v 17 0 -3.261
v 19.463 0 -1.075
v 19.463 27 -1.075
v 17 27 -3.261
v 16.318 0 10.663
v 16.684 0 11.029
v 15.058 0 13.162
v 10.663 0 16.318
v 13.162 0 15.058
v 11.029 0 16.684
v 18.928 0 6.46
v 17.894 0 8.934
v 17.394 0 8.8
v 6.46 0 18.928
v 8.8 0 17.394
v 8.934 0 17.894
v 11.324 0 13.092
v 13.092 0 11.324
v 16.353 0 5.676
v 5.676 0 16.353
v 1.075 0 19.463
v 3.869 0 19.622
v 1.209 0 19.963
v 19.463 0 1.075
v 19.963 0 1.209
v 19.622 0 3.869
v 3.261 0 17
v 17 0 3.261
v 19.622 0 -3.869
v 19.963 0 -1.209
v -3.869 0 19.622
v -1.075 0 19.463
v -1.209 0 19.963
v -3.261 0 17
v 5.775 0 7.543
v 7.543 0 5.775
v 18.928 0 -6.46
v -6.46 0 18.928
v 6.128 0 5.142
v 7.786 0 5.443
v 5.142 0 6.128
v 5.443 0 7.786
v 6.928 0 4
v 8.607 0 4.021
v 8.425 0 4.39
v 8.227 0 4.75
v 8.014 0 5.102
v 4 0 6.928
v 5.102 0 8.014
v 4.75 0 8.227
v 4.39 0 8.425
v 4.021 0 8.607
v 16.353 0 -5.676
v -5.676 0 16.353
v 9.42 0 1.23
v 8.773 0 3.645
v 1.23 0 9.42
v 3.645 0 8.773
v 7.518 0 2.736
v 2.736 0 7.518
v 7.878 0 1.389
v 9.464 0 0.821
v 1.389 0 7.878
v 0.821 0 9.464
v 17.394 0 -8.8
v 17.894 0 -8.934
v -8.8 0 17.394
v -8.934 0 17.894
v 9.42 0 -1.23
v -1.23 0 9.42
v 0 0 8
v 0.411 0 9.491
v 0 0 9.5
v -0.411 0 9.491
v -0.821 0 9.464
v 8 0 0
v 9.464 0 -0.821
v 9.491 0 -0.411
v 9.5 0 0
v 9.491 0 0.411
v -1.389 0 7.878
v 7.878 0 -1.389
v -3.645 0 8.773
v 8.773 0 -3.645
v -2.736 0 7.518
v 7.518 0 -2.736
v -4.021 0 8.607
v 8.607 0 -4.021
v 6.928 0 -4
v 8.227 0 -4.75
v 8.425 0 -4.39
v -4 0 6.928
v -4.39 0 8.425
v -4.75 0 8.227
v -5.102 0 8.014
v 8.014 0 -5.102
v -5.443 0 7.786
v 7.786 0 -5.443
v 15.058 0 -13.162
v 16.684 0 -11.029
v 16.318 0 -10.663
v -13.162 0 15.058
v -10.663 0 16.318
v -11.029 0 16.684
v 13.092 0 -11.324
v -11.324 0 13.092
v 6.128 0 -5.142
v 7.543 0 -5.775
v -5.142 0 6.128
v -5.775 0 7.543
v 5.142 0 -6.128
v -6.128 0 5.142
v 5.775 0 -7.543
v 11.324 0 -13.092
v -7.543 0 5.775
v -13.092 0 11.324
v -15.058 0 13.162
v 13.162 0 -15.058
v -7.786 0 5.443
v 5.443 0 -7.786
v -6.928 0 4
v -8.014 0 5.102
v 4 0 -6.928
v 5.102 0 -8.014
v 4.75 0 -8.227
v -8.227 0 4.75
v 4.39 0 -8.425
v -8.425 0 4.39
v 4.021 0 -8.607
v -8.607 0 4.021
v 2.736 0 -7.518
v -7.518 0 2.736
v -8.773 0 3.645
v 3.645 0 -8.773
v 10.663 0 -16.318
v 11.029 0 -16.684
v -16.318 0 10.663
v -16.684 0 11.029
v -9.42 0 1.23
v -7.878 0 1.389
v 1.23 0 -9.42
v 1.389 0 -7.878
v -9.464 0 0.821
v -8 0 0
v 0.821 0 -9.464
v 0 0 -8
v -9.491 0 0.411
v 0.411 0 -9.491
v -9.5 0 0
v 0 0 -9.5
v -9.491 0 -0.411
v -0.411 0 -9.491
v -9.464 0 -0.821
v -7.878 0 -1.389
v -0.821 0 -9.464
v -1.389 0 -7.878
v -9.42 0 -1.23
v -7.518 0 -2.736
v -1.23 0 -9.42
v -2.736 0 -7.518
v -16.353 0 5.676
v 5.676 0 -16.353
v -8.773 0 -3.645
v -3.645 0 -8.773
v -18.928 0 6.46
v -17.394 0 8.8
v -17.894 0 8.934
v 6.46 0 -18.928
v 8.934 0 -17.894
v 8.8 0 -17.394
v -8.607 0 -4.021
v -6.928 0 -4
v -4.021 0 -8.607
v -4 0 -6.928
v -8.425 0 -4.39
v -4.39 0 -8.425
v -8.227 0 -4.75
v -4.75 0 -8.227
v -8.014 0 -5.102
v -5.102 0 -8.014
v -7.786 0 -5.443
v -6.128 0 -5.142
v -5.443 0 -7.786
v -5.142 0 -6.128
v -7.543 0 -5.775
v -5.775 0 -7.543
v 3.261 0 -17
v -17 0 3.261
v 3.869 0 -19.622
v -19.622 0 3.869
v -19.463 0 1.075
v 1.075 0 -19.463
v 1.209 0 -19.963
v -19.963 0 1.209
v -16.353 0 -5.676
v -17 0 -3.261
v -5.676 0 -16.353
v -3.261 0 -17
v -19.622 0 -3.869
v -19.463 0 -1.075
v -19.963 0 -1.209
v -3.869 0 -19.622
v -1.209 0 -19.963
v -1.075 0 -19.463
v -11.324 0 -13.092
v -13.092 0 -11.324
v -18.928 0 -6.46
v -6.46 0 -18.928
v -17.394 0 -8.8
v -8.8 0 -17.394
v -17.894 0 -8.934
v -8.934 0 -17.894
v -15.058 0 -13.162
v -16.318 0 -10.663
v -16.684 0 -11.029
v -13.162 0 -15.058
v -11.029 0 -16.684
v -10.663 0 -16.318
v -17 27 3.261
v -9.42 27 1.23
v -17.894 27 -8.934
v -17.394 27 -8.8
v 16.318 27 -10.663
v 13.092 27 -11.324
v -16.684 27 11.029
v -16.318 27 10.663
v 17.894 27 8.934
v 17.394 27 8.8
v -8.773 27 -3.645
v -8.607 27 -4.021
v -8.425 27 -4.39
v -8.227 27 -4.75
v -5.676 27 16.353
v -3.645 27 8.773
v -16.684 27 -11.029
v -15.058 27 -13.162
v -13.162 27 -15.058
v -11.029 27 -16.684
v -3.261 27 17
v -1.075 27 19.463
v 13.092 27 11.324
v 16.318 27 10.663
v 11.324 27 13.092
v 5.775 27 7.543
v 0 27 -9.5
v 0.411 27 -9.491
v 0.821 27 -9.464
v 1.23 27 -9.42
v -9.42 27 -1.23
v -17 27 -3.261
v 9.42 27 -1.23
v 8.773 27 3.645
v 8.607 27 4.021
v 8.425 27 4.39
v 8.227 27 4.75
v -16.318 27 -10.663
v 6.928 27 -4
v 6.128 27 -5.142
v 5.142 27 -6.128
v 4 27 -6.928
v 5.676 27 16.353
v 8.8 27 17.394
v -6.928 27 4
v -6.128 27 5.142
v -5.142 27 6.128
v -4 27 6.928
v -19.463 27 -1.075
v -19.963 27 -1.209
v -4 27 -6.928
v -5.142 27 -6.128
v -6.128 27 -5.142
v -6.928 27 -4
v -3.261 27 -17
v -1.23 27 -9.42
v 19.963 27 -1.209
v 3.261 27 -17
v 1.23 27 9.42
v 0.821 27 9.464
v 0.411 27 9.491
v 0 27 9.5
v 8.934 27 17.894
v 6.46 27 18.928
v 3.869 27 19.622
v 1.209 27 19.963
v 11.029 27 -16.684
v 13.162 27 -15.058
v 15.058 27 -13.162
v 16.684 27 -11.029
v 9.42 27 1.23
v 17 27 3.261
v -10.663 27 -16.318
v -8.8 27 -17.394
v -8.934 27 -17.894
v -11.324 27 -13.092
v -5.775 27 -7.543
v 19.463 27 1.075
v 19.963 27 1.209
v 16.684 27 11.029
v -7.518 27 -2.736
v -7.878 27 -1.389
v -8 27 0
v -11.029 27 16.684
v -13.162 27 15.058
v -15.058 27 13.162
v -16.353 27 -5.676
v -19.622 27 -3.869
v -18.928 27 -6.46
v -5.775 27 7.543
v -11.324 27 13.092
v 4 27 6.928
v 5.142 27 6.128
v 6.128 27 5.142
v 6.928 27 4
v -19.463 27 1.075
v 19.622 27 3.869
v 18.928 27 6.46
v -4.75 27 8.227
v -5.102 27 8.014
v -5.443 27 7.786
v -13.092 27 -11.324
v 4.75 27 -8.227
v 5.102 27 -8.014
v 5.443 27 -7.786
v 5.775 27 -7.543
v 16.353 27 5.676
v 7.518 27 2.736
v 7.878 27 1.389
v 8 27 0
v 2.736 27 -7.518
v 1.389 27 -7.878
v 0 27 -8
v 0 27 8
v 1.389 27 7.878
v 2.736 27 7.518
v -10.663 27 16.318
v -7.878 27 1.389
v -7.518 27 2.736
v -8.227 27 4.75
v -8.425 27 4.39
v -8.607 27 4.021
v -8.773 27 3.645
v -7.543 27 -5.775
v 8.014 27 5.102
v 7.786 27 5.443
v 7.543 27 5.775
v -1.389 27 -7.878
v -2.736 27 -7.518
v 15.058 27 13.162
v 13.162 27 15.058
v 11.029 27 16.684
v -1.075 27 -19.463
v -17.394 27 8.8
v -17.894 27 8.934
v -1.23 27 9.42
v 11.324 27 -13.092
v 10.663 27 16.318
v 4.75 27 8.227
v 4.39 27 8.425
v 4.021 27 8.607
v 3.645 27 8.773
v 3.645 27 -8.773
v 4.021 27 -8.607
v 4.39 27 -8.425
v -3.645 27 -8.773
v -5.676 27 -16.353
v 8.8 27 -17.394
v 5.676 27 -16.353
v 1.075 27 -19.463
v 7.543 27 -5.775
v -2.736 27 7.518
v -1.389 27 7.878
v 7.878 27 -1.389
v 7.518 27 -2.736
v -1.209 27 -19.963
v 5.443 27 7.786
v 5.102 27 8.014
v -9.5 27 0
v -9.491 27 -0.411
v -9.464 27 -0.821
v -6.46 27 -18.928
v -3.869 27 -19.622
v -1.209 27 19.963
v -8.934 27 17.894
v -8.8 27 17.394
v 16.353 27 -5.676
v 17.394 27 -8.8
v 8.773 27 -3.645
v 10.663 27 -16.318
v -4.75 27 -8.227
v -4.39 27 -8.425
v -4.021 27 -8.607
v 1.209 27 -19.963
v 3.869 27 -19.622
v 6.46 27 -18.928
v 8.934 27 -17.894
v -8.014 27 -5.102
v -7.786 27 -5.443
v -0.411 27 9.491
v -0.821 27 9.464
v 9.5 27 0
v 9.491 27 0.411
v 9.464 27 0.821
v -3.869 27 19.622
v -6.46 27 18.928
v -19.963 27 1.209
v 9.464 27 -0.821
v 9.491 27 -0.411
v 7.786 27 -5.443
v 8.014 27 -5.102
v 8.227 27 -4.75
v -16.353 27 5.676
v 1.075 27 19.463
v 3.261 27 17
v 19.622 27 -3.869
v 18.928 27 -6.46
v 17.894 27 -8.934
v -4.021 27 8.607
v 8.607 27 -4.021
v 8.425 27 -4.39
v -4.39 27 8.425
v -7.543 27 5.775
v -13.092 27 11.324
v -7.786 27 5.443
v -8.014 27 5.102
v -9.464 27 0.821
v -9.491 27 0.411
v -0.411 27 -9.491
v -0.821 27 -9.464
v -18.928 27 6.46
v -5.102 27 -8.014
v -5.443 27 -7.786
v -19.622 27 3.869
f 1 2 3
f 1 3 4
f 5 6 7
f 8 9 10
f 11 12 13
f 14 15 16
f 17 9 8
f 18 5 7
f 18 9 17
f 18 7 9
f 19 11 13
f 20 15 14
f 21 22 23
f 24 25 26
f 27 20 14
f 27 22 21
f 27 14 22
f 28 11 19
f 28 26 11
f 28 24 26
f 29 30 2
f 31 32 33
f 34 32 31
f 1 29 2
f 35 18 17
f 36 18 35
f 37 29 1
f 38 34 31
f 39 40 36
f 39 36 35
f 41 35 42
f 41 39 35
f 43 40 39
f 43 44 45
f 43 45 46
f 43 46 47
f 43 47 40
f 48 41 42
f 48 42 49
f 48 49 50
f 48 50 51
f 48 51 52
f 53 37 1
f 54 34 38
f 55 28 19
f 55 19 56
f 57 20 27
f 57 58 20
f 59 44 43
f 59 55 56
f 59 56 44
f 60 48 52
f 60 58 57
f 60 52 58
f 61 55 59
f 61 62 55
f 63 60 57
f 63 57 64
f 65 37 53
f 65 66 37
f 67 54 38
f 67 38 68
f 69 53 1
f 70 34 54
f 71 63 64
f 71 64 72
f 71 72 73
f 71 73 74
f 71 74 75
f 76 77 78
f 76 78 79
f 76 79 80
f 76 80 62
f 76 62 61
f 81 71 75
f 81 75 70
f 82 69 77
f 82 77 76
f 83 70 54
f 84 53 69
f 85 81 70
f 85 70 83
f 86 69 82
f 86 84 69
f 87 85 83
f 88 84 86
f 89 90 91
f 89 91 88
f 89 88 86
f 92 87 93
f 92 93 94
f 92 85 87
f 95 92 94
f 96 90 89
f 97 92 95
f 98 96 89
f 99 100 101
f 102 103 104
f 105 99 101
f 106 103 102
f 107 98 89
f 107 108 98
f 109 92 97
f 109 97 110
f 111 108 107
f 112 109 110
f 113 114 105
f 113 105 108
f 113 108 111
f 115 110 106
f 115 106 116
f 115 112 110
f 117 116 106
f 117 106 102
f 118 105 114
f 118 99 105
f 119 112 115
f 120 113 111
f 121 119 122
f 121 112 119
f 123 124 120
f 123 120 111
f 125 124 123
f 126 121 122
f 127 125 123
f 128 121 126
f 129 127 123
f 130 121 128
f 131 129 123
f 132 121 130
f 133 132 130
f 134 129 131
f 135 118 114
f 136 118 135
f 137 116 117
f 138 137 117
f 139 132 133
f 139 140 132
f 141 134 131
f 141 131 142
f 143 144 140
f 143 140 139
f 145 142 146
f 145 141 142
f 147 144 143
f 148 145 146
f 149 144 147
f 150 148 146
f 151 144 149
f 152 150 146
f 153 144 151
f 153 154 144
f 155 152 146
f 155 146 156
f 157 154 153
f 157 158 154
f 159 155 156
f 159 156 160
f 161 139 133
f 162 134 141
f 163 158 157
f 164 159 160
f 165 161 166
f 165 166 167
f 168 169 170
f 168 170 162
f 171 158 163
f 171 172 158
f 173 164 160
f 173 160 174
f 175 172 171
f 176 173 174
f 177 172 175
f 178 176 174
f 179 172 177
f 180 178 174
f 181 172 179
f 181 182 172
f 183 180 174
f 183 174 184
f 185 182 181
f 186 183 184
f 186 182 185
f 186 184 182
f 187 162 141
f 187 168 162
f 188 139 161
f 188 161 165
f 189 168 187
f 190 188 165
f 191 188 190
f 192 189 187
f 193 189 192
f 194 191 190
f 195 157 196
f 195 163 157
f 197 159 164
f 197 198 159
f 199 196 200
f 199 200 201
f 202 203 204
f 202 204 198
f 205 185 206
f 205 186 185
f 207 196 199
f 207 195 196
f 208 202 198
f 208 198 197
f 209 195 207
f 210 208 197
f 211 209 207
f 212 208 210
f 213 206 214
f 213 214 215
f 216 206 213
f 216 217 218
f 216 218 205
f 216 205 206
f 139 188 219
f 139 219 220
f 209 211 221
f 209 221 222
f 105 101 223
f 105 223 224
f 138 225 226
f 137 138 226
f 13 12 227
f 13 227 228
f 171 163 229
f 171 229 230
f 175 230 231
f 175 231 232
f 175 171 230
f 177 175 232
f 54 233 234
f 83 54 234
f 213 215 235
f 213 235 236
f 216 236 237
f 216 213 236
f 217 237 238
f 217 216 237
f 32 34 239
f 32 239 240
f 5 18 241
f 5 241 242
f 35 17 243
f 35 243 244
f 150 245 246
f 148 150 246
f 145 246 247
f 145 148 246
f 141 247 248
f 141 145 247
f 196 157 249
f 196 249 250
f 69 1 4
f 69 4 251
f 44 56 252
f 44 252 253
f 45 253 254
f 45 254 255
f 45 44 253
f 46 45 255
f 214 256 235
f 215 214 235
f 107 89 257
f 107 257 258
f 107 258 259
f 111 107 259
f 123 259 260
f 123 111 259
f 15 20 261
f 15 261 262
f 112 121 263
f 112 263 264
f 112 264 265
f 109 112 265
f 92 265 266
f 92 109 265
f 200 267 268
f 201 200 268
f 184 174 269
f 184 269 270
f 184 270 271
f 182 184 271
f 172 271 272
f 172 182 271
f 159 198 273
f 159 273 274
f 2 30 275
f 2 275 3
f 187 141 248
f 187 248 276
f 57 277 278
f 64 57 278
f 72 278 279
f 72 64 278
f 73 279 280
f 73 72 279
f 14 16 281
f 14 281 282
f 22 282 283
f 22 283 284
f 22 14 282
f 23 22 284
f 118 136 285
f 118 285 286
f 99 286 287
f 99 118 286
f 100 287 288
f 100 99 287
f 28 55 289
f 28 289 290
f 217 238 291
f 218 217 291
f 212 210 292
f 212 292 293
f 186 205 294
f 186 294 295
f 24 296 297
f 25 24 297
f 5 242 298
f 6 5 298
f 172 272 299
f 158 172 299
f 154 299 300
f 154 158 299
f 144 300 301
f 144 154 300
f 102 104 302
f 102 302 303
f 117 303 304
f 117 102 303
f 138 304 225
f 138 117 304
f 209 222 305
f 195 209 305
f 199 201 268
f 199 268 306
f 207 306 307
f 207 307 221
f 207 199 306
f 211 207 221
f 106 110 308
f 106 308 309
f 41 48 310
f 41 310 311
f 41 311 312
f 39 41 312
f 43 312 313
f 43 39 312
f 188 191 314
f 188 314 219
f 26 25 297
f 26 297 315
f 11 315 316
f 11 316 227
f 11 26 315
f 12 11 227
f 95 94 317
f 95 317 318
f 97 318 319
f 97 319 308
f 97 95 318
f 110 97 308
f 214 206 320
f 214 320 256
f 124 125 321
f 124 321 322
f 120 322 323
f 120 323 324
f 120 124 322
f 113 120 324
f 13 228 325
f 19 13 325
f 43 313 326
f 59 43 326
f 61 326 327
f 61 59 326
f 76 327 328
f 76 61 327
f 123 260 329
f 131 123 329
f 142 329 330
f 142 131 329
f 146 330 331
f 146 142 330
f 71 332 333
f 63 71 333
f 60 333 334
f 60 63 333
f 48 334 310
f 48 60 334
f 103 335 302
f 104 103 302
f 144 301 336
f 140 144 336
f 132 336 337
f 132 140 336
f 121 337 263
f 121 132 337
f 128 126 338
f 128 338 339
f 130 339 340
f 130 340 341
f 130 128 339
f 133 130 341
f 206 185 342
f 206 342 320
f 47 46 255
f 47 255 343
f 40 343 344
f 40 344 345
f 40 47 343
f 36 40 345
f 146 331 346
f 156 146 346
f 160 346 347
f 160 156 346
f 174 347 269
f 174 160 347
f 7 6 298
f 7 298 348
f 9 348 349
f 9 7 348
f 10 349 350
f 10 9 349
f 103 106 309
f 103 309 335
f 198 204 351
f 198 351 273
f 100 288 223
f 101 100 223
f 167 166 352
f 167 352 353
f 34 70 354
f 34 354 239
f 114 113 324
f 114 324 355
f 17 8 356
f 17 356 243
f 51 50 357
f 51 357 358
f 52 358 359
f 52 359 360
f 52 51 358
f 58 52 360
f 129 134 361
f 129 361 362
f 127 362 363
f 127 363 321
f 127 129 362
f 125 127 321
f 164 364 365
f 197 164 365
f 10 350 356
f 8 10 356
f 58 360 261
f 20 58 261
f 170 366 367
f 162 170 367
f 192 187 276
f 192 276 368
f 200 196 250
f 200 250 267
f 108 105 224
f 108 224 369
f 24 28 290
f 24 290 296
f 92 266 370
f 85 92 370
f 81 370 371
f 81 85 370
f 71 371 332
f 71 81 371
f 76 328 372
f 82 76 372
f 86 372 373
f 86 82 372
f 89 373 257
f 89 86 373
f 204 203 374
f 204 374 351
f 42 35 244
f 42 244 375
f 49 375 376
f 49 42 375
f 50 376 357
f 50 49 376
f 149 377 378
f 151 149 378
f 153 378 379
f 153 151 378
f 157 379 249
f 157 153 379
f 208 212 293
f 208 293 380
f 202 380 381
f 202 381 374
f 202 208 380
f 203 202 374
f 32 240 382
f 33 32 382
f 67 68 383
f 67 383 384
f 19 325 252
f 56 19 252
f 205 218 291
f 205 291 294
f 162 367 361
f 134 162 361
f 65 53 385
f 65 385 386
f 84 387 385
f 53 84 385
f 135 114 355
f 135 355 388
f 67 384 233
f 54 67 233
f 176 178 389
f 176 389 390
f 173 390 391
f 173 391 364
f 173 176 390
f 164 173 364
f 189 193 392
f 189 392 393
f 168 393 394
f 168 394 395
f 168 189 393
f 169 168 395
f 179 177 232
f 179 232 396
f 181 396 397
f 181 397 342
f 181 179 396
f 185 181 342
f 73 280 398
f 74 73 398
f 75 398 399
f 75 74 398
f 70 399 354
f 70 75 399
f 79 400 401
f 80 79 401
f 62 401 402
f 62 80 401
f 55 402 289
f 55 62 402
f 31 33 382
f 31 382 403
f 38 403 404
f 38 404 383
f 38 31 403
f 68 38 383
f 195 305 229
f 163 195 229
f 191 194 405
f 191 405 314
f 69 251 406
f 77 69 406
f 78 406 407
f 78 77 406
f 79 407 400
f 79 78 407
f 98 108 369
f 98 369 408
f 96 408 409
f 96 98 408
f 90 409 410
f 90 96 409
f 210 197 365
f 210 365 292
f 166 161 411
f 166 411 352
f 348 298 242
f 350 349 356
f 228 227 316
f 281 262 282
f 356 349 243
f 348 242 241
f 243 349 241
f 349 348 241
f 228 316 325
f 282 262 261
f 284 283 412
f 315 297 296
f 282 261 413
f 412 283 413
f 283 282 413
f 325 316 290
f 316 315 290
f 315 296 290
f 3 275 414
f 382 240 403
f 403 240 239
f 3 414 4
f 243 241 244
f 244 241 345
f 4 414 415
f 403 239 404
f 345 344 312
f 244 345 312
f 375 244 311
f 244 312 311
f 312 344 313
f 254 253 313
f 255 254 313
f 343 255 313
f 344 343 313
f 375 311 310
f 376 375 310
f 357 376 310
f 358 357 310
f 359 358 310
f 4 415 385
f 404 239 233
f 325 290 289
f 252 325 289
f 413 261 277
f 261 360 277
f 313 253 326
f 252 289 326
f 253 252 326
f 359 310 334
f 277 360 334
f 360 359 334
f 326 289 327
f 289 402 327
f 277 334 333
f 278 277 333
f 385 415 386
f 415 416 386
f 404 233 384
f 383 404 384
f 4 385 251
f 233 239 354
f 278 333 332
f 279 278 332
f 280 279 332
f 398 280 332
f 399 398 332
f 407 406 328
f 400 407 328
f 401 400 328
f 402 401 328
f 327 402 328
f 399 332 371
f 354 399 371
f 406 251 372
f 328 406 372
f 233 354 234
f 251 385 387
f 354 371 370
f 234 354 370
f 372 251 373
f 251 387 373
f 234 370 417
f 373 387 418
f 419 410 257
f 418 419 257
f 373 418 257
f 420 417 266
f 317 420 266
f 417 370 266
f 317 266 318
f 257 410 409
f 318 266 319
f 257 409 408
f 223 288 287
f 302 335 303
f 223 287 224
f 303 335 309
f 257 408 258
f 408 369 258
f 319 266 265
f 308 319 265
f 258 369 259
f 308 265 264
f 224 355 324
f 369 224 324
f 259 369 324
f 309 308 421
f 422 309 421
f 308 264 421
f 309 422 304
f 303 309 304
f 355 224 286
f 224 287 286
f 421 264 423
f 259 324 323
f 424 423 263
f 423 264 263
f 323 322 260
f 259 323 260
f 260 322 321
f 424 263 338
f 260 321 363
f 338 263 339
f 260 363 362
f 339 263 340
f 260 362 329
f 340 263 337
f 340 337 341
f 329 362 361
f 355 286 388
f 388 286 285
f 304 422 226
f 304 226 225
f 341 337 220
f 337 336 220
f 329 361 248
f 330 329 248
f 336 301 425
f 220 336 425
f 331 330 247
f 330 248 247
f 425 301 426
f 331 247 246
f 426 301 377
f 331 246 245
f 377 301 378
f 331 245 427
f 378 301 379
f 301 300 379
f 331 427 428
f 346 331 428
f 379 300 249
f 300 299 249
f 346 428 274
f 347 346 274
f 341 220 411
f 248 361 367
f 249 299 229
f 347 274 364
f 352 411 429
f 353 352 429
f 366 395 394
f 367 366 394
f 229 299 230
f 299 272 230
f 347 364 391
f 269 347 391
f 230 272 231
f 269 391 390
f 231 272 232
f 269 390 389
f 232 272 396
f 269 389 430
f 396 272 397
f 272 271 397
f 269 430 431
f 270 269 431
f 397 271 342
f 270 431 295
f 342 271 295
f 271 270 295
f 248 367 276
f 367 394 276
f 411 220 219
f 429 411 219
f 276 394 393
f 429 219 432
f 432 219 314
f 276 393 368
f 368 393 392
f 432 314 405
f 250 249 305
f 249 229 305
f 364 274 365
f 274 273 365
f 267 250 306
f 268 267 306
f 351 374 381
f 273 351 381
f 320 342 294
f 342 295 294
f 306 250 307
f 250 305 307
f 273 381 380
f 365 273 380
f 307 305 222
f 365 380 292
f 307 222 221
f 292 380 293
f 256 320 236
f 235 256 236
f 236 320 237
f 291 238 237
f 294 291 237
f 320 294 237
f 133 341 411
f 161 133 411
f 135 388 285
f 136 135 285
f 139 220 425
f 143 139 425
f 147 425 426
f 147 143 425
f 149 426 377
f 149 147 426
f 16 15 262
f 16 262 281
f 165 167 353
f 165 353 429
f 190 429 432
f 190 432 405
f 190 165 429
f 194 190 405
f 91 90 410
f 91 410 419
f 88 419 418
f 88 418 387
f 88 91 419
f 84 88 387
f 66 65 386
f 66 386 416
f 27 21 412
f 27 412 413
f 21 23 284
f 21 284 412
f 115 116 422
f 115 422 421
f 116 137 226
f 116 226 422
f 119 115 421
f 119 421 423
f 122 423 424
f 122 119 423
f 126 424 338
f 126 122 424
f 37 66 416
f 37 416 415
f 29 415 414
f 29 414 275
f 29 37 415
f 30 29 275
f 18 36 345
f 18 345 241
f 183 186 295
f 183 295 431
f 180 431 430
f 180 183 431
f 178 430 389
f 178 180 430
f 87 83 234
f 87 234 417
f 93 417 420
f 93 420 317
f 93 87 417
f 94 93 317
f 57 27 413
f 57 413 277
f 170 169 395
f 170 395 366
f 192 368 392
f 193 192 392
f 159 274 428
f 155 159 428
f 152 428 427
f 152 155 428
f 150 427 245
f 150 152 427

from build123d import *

# Parameters (mm, degrees)
BOSS_EXTRUDE1_DEPTH = 27


with BuildPart() as part:
    # Sketch1 → Boss-Extrude1 (new body)
    with BuildSketch(Plane(origin=(0, 0, 0), x_dir=(1, 0, 0), z_dir=(0, 1, 0))):
        with BuildLine():
            Line((1.229996254, 9.420037644), (3.261041046, 17))
            Line((3.261041046, 17), (1.075459685, 19.463398226))
            Line((1.075459685, 19.463398226), (1.209434281, 19.963398226))
            ThreePointArc((1.209434281, 19.963398226), (5.176380902, 19.318516526), (8.934298302, 17.89352715))
            Line((8.934298302, 17.89352715), (8.800323705, 17.39352715))
            Line((8.800323705, 17.39352715), (5.675855612, 16.352952387))
            Line((5.675855612, 16.352952387), (3.64481082, 8.772990031))
            ThreePointArc((3.64481082, 8.772990031), (4.206265872, 8.5180589), (4.75, 8.227241336))
            ThreePointArc((4.75, 8.227241336), (5.273722462, 7.90176255), (5.775226824, 7.542993777))
            Line((5.775226824, 7.542993777), (11.324144388, 13.091911341))
            Line((11.324144388, 13.091911341), (10.66307452, 16.318067465))
            Line((10.66307452, 16.318067465), (11.029099924, 16.684092869))
            ThreePointArc((11.029099924, 16.684092869), (14.142135624, 14.142135624), (16.684092869, 11.029099924))
            Line((16.684092869, 11.029099924), (16.318067465, 10.66307452))
            Line((16.318067465, 10.66307452), (13.091911341, 11.324144388))
            Line((13.091911341, 11.324144388), (7.542993777, 5.775226824))
            ThreePointArc((7.542993777, 5.775226824), (7.90176255, 5.273722462), (8.227241336, 4.75))
            ThreePointArc((8.227241336, 4.75), (8.5180589, 4.206265872), (8.772990031, 3.64481082))
            Line((8.772990031, 3.64481082), (16.352952387, 5.675855612))
            Line((16.352952387, 5.675855612), (17.39352715, 8.800323705))
            Line((17.39352715, 8.800323705), (17.89352715, 8.934298302))
            ThreePointArc((17.89352715, 8.934298302), (19.318516526, 5.176380902), (19.963398226, 1.209434281))
            Line((19.963398226, 1.209434281), (19.463398226, 1.075459685))
            Line((19.463398226, 1.075459685), (17, 3.261041046))
            Line((17, 3.261041046), (9.420037644, 1.229996254))
            ThreePointArc((9.420037644, 1.229996254), (9.479988334, 0.61629635), (9.5, 0))
            ThreePointArc((9.5, 0), (9.479988334, -0.61629635), (9.420037644, -1.229996254))
            Line((9.420037644, -1.229996254), (17, -3.261041046))
            Line((17, -3.261041046), (19.463398226, -1.075459685))
            Line((19.463398226, -1.075459685), (19.963398226, -1.209434281))
            ThreePointArc((19.963398226, -1.209434281), (19.318516526, -5.176380902), (17.89352715, -8.934298302))
            Line((17.89352715, -8.934298302), (17.39352715, -8.800323705))
            Line((17.39352715, -8.800323705), (16.352952387, -5.675855612))
            Line((16.352952387, -5.675855612), (8.772990031, -3.64481082))
            ThreePointArc((8.772990031, -3.64481082), (8.5180589, -4.206265872), (8.227241336, -4.75))
            ThreePointArc((8.227241336, -4.75), (7.90176255, -5.273722462), (7.542993777, -5.775226824))
            Line((7.542993777, -5.775226824), (13.091911341, -11.324144388))
            Line((13.091911341, -11.324144388), (16.318067465, -10.66307452))
            Line((16.318067465, -10.66307452), (16.684092869, -11.029099924))
            ThreePointArc((16.684092869, -11.029099924), (14.142135624, -14.142135624), (11.029099924, -16.684092869))
            Line((11.029099924, -16.684092869), (10.66307452, -16.318067465))
            Line((10.66307452, -16.318067465), (11.324144388, -13.091911341))
            Line((11.324144388, -13.091911341), (5.775226824, -7.542993777))
            ThreePointArc((5.775226824, -7.542993777), (5.273722462, -7.90176255), (4.75, -8.227241336))
            ThreePointArc((4.75, -8.227241336), (4.206265872, -8.5180589), (3.64481082, -8.772990031))
            Line((3.64481082, -8.772990031), (5.675855612, -16.352952387))
            Line((5.675855612, -16.352952387), (8.800323705, -17.39352715))
            Line((8.800323705, -17.39352715), (8.934298302, -17.89352715))
            ThreePointArc((8.934298302, -17.89352715), (5.176380902, -19.318516526), (1.209434281, -19.963398226))
            Line((1.209434281, -19.963398226), (1.075459685, -19.463398226))
            Line((1.075459685, -19.463398226), (3.261041046, -17))
            Line((3.261041046, -17), (1.229996254, -9.420037644))
            ThreePointArc((1.229996254, -9.420037644), (0.61629635, -9.479988334), (0, -9.5))
            ThreePointArc((0, -9.5), (-0.61629635, -9.479988334), (-1.229996254, -9.420037644))
            Line((-1.229996254, -9.420037644), (-3.261041046, -17))
            Line((-3.261041046, -17), (-1.075459685, -19.463398226))
            Line((-1.075459685, -19.463398226), (-1.209434281, -19.963398226))
            ThreePointArc((-1.209434281, -19.963398226), (-5.176380902, -19.318516526), (-8.934298302, -17.89352715))
            Line((-8.934298302, -17.89352715), (-8.800323705, -17.39352715))
            Line((-8.800323705, -17.39352715), (-5.675855612, -16.352952387))
            Line((-5.675855612, -16.352952387), (-3.64481082, -8.772990031))
            ThreePointArc((-3.64481082, -8.772990031), (-4.206265872, -8.5180589), (-4.75, -8.227241336))
            ThreePointArc((-4.75, -8.227241336), (-5.273722462, -7.90176255), (-5.775226824, -7.542993777))
            Line((-5.775226824, -7.542993777), (-11.324144388, -13.091911341))
            Line((-11.324144388, -13.091911341), (-10.66307452, -16.318067465))
            Line((-10.66307452, -16.318067465), (-11.029099924, -16.684092869))
            ThreePointArc((-11.029099924, -16.684092869), (-14.142135624, -14.142135624), (-16.684092869, -11.029099924))
            Line((-16.684092869, -11.029099924), (-16.318067465, -10.66307452))
            Line((-16.318067465, -10.66307452), (-13.091911341, -11.324144388))
            Line((-13.091911341, -11.324144388), (-7.542993777, -5.775226824))
            ThreePointArc((-7.542993777, -5.775226824), (-7.90176255, -5.273722462), (-8.227241336, -4.75))
            ThreePointArc((-8.227241336, -4.75), (-8.5180589, -4.206265872), (-8.772990031, -3.64481082))
            Line((-8.772990031, -3.64481082), (-16.352952387, -5.675855612))
            Line((-16.352952387, -5.675855612), (-17.39352715, -8.800323705))
            Line((-17.39352715, -8.800323705), (-17.89352715, -8.934298302))
            ThreePointArc((-17.89352715, -8.934298302), (-19.318516526, -5.176380902), (-19.963398226, -1.209434281))
            Line((-19.963398226, -1.209434281), (-19.463398226, -1.075459685))
            Line((-19.463398226, -1.075459685), (-17, -3.261041046))
            Line((-17, -3.261041046), (-9.420037644, -1.229996254))
            ThreePointArc((-9.420037644, -1.229996254), (-9.479988334, -0.61629635), (-9.5, 0))
            ThreePointArc((-9.5, 0), (-9.479988334, 0.61629635), (-9.420037644, 1.229996254))
            Line((-9.420037644, 1.229996254), (-17, 3.261041046))
            Line((-17, 3.261041046), (-19.463398226, 1.075459685))
            Line((-19.463398226, 1.075459685), (-19.963398226, 1.209434281))
            ThreePointArc((-19.963398226, 1.209434281), (-19.318516526, 5.176380902), (-17.89352715, 8.934298302))
            Line((-17.89352715, 8.934298302), (-17.39352715, 8.800323705))
            Line((-17.39352715, 8.800323705), (-16.352952387, 5.675855612))
            Line((-16.352952387, 5.675855612), (-8.772990031, 3.64481082))
            ThreePointArc((-8.772990031, 3.64481082), (-8.5180589, 4.206265872), (-8.227241336, 4.75))
            ThreePointArc((-8.227241336, 4.75), (-7.90176255, 5.273722462), (-7.542993777, 5.775226824))
            Line((-7.542993777, 5.775226824), (-13.091911341, 11.324144388))
            Line((-13.091911341, 11.324144388), (-16.318067465, 10.66307452))
            Line((-16.318067465, 10.66307452), (-16.684092869, 11.029099924))
            ThreePointArc((-16.684092869, 11.029099924), (-14.142135624, 14.142135624), (-11.029099924, 16.684092869))
            Line((-11.029099924, 16.684092869), (-10.66307452, 16.318067465))
            Line((-10.66307452, 16.318067465), (-11.324144388, 13.091911341))
            Line((-11.324144388, 13.091911341), (-5.775226824, 7.542993777))
            ThreePointArc((-5.775226824, 7.542993777), (-5.273722462, 7.90176255), (-4.75, 8.227241336))
            ThreePointArc((-4.75, 8.227241336), (-4.206265872, 8.5180589), (-3.64481082, 8.772990031))
            Line((-3.64481082, 8.772990031), (-5.675855612, 16.352952387))
            Line((-5.675855612, 16.352952387), (-8.800323705, 17.39352715))
            Line((-8.800323705, 17.39352715), (-8.934298302, 17.89352715))
            ThreePointArc((-8.934298302, 17.89352715), (-5.176380902, 19.318516526), (-1.209434281, 19.963398226))
            Line((-1.209434281, 19.963398226), (-1.075459685, 19.463398226))
            Line((-1.075459685, 19.463398226), (-3.261041046, 17))
            Line((-3.261041046, 17), (-1.229996254, 9.420037644))
            ThreePointArc((-1.229996254, 9.420037644), (-0.61629635, 9.479988334), (0, 9.5))
            ThreePointArc((0, 9.5), (0.61629635, 9.479988334), (1.229996254, 9.420037644))
        make_face()
        with BuildLine():
            ThreePointArc((4, 6.92820323), (2.070552361, 7.72740661), (0, 8))
            ThreePointArc((0, 8), (-2.070552361, 7.72740661), (-4, 6.92820323))
            ThreePointArc((-4, 6.92820323), (-5.656854249, 5.656854249), (-6.92820323, 4))
            ThreePointArc((-6.92820323, 4), (-7.72740661, 2.070552361), (-8, 0))
            ThreePointArc((-8, 0), (-7.72740661, -2.070552361), (-6.92820323, -4))
            ThreePointArc((-6.92820323, -4), (-5.656854249, -5.656854249), (-4, -6.92820323))
            ThreePointArc((-4, -6.92820323), (-2.070552361, -7.72740661), (0, -8))
            ThreePointArc((0, -8), (2.070552361, -7.72740661), (4, -6.92820323))
            ThreePointArc((4, -6.92820323), (5.656854249, -5.656854249), (6.92820323, -4))
            ThreePointArc((6.92820323, -4), (7.72740661, -2.070552361), (8, 0))
            ThreePointArc((8, 0), (7.72740661, 2.070552361), (6.92820323, 4))
            ThreePointArc((6.92820323, 4), (5.656854249, 5.656854249), (4, 6.92820323))
        make_face(mode=Mode.SUBTRACT)
    extrude(amount=BOSS_EXTRUDE1_DEPTH)


solid = part.part
